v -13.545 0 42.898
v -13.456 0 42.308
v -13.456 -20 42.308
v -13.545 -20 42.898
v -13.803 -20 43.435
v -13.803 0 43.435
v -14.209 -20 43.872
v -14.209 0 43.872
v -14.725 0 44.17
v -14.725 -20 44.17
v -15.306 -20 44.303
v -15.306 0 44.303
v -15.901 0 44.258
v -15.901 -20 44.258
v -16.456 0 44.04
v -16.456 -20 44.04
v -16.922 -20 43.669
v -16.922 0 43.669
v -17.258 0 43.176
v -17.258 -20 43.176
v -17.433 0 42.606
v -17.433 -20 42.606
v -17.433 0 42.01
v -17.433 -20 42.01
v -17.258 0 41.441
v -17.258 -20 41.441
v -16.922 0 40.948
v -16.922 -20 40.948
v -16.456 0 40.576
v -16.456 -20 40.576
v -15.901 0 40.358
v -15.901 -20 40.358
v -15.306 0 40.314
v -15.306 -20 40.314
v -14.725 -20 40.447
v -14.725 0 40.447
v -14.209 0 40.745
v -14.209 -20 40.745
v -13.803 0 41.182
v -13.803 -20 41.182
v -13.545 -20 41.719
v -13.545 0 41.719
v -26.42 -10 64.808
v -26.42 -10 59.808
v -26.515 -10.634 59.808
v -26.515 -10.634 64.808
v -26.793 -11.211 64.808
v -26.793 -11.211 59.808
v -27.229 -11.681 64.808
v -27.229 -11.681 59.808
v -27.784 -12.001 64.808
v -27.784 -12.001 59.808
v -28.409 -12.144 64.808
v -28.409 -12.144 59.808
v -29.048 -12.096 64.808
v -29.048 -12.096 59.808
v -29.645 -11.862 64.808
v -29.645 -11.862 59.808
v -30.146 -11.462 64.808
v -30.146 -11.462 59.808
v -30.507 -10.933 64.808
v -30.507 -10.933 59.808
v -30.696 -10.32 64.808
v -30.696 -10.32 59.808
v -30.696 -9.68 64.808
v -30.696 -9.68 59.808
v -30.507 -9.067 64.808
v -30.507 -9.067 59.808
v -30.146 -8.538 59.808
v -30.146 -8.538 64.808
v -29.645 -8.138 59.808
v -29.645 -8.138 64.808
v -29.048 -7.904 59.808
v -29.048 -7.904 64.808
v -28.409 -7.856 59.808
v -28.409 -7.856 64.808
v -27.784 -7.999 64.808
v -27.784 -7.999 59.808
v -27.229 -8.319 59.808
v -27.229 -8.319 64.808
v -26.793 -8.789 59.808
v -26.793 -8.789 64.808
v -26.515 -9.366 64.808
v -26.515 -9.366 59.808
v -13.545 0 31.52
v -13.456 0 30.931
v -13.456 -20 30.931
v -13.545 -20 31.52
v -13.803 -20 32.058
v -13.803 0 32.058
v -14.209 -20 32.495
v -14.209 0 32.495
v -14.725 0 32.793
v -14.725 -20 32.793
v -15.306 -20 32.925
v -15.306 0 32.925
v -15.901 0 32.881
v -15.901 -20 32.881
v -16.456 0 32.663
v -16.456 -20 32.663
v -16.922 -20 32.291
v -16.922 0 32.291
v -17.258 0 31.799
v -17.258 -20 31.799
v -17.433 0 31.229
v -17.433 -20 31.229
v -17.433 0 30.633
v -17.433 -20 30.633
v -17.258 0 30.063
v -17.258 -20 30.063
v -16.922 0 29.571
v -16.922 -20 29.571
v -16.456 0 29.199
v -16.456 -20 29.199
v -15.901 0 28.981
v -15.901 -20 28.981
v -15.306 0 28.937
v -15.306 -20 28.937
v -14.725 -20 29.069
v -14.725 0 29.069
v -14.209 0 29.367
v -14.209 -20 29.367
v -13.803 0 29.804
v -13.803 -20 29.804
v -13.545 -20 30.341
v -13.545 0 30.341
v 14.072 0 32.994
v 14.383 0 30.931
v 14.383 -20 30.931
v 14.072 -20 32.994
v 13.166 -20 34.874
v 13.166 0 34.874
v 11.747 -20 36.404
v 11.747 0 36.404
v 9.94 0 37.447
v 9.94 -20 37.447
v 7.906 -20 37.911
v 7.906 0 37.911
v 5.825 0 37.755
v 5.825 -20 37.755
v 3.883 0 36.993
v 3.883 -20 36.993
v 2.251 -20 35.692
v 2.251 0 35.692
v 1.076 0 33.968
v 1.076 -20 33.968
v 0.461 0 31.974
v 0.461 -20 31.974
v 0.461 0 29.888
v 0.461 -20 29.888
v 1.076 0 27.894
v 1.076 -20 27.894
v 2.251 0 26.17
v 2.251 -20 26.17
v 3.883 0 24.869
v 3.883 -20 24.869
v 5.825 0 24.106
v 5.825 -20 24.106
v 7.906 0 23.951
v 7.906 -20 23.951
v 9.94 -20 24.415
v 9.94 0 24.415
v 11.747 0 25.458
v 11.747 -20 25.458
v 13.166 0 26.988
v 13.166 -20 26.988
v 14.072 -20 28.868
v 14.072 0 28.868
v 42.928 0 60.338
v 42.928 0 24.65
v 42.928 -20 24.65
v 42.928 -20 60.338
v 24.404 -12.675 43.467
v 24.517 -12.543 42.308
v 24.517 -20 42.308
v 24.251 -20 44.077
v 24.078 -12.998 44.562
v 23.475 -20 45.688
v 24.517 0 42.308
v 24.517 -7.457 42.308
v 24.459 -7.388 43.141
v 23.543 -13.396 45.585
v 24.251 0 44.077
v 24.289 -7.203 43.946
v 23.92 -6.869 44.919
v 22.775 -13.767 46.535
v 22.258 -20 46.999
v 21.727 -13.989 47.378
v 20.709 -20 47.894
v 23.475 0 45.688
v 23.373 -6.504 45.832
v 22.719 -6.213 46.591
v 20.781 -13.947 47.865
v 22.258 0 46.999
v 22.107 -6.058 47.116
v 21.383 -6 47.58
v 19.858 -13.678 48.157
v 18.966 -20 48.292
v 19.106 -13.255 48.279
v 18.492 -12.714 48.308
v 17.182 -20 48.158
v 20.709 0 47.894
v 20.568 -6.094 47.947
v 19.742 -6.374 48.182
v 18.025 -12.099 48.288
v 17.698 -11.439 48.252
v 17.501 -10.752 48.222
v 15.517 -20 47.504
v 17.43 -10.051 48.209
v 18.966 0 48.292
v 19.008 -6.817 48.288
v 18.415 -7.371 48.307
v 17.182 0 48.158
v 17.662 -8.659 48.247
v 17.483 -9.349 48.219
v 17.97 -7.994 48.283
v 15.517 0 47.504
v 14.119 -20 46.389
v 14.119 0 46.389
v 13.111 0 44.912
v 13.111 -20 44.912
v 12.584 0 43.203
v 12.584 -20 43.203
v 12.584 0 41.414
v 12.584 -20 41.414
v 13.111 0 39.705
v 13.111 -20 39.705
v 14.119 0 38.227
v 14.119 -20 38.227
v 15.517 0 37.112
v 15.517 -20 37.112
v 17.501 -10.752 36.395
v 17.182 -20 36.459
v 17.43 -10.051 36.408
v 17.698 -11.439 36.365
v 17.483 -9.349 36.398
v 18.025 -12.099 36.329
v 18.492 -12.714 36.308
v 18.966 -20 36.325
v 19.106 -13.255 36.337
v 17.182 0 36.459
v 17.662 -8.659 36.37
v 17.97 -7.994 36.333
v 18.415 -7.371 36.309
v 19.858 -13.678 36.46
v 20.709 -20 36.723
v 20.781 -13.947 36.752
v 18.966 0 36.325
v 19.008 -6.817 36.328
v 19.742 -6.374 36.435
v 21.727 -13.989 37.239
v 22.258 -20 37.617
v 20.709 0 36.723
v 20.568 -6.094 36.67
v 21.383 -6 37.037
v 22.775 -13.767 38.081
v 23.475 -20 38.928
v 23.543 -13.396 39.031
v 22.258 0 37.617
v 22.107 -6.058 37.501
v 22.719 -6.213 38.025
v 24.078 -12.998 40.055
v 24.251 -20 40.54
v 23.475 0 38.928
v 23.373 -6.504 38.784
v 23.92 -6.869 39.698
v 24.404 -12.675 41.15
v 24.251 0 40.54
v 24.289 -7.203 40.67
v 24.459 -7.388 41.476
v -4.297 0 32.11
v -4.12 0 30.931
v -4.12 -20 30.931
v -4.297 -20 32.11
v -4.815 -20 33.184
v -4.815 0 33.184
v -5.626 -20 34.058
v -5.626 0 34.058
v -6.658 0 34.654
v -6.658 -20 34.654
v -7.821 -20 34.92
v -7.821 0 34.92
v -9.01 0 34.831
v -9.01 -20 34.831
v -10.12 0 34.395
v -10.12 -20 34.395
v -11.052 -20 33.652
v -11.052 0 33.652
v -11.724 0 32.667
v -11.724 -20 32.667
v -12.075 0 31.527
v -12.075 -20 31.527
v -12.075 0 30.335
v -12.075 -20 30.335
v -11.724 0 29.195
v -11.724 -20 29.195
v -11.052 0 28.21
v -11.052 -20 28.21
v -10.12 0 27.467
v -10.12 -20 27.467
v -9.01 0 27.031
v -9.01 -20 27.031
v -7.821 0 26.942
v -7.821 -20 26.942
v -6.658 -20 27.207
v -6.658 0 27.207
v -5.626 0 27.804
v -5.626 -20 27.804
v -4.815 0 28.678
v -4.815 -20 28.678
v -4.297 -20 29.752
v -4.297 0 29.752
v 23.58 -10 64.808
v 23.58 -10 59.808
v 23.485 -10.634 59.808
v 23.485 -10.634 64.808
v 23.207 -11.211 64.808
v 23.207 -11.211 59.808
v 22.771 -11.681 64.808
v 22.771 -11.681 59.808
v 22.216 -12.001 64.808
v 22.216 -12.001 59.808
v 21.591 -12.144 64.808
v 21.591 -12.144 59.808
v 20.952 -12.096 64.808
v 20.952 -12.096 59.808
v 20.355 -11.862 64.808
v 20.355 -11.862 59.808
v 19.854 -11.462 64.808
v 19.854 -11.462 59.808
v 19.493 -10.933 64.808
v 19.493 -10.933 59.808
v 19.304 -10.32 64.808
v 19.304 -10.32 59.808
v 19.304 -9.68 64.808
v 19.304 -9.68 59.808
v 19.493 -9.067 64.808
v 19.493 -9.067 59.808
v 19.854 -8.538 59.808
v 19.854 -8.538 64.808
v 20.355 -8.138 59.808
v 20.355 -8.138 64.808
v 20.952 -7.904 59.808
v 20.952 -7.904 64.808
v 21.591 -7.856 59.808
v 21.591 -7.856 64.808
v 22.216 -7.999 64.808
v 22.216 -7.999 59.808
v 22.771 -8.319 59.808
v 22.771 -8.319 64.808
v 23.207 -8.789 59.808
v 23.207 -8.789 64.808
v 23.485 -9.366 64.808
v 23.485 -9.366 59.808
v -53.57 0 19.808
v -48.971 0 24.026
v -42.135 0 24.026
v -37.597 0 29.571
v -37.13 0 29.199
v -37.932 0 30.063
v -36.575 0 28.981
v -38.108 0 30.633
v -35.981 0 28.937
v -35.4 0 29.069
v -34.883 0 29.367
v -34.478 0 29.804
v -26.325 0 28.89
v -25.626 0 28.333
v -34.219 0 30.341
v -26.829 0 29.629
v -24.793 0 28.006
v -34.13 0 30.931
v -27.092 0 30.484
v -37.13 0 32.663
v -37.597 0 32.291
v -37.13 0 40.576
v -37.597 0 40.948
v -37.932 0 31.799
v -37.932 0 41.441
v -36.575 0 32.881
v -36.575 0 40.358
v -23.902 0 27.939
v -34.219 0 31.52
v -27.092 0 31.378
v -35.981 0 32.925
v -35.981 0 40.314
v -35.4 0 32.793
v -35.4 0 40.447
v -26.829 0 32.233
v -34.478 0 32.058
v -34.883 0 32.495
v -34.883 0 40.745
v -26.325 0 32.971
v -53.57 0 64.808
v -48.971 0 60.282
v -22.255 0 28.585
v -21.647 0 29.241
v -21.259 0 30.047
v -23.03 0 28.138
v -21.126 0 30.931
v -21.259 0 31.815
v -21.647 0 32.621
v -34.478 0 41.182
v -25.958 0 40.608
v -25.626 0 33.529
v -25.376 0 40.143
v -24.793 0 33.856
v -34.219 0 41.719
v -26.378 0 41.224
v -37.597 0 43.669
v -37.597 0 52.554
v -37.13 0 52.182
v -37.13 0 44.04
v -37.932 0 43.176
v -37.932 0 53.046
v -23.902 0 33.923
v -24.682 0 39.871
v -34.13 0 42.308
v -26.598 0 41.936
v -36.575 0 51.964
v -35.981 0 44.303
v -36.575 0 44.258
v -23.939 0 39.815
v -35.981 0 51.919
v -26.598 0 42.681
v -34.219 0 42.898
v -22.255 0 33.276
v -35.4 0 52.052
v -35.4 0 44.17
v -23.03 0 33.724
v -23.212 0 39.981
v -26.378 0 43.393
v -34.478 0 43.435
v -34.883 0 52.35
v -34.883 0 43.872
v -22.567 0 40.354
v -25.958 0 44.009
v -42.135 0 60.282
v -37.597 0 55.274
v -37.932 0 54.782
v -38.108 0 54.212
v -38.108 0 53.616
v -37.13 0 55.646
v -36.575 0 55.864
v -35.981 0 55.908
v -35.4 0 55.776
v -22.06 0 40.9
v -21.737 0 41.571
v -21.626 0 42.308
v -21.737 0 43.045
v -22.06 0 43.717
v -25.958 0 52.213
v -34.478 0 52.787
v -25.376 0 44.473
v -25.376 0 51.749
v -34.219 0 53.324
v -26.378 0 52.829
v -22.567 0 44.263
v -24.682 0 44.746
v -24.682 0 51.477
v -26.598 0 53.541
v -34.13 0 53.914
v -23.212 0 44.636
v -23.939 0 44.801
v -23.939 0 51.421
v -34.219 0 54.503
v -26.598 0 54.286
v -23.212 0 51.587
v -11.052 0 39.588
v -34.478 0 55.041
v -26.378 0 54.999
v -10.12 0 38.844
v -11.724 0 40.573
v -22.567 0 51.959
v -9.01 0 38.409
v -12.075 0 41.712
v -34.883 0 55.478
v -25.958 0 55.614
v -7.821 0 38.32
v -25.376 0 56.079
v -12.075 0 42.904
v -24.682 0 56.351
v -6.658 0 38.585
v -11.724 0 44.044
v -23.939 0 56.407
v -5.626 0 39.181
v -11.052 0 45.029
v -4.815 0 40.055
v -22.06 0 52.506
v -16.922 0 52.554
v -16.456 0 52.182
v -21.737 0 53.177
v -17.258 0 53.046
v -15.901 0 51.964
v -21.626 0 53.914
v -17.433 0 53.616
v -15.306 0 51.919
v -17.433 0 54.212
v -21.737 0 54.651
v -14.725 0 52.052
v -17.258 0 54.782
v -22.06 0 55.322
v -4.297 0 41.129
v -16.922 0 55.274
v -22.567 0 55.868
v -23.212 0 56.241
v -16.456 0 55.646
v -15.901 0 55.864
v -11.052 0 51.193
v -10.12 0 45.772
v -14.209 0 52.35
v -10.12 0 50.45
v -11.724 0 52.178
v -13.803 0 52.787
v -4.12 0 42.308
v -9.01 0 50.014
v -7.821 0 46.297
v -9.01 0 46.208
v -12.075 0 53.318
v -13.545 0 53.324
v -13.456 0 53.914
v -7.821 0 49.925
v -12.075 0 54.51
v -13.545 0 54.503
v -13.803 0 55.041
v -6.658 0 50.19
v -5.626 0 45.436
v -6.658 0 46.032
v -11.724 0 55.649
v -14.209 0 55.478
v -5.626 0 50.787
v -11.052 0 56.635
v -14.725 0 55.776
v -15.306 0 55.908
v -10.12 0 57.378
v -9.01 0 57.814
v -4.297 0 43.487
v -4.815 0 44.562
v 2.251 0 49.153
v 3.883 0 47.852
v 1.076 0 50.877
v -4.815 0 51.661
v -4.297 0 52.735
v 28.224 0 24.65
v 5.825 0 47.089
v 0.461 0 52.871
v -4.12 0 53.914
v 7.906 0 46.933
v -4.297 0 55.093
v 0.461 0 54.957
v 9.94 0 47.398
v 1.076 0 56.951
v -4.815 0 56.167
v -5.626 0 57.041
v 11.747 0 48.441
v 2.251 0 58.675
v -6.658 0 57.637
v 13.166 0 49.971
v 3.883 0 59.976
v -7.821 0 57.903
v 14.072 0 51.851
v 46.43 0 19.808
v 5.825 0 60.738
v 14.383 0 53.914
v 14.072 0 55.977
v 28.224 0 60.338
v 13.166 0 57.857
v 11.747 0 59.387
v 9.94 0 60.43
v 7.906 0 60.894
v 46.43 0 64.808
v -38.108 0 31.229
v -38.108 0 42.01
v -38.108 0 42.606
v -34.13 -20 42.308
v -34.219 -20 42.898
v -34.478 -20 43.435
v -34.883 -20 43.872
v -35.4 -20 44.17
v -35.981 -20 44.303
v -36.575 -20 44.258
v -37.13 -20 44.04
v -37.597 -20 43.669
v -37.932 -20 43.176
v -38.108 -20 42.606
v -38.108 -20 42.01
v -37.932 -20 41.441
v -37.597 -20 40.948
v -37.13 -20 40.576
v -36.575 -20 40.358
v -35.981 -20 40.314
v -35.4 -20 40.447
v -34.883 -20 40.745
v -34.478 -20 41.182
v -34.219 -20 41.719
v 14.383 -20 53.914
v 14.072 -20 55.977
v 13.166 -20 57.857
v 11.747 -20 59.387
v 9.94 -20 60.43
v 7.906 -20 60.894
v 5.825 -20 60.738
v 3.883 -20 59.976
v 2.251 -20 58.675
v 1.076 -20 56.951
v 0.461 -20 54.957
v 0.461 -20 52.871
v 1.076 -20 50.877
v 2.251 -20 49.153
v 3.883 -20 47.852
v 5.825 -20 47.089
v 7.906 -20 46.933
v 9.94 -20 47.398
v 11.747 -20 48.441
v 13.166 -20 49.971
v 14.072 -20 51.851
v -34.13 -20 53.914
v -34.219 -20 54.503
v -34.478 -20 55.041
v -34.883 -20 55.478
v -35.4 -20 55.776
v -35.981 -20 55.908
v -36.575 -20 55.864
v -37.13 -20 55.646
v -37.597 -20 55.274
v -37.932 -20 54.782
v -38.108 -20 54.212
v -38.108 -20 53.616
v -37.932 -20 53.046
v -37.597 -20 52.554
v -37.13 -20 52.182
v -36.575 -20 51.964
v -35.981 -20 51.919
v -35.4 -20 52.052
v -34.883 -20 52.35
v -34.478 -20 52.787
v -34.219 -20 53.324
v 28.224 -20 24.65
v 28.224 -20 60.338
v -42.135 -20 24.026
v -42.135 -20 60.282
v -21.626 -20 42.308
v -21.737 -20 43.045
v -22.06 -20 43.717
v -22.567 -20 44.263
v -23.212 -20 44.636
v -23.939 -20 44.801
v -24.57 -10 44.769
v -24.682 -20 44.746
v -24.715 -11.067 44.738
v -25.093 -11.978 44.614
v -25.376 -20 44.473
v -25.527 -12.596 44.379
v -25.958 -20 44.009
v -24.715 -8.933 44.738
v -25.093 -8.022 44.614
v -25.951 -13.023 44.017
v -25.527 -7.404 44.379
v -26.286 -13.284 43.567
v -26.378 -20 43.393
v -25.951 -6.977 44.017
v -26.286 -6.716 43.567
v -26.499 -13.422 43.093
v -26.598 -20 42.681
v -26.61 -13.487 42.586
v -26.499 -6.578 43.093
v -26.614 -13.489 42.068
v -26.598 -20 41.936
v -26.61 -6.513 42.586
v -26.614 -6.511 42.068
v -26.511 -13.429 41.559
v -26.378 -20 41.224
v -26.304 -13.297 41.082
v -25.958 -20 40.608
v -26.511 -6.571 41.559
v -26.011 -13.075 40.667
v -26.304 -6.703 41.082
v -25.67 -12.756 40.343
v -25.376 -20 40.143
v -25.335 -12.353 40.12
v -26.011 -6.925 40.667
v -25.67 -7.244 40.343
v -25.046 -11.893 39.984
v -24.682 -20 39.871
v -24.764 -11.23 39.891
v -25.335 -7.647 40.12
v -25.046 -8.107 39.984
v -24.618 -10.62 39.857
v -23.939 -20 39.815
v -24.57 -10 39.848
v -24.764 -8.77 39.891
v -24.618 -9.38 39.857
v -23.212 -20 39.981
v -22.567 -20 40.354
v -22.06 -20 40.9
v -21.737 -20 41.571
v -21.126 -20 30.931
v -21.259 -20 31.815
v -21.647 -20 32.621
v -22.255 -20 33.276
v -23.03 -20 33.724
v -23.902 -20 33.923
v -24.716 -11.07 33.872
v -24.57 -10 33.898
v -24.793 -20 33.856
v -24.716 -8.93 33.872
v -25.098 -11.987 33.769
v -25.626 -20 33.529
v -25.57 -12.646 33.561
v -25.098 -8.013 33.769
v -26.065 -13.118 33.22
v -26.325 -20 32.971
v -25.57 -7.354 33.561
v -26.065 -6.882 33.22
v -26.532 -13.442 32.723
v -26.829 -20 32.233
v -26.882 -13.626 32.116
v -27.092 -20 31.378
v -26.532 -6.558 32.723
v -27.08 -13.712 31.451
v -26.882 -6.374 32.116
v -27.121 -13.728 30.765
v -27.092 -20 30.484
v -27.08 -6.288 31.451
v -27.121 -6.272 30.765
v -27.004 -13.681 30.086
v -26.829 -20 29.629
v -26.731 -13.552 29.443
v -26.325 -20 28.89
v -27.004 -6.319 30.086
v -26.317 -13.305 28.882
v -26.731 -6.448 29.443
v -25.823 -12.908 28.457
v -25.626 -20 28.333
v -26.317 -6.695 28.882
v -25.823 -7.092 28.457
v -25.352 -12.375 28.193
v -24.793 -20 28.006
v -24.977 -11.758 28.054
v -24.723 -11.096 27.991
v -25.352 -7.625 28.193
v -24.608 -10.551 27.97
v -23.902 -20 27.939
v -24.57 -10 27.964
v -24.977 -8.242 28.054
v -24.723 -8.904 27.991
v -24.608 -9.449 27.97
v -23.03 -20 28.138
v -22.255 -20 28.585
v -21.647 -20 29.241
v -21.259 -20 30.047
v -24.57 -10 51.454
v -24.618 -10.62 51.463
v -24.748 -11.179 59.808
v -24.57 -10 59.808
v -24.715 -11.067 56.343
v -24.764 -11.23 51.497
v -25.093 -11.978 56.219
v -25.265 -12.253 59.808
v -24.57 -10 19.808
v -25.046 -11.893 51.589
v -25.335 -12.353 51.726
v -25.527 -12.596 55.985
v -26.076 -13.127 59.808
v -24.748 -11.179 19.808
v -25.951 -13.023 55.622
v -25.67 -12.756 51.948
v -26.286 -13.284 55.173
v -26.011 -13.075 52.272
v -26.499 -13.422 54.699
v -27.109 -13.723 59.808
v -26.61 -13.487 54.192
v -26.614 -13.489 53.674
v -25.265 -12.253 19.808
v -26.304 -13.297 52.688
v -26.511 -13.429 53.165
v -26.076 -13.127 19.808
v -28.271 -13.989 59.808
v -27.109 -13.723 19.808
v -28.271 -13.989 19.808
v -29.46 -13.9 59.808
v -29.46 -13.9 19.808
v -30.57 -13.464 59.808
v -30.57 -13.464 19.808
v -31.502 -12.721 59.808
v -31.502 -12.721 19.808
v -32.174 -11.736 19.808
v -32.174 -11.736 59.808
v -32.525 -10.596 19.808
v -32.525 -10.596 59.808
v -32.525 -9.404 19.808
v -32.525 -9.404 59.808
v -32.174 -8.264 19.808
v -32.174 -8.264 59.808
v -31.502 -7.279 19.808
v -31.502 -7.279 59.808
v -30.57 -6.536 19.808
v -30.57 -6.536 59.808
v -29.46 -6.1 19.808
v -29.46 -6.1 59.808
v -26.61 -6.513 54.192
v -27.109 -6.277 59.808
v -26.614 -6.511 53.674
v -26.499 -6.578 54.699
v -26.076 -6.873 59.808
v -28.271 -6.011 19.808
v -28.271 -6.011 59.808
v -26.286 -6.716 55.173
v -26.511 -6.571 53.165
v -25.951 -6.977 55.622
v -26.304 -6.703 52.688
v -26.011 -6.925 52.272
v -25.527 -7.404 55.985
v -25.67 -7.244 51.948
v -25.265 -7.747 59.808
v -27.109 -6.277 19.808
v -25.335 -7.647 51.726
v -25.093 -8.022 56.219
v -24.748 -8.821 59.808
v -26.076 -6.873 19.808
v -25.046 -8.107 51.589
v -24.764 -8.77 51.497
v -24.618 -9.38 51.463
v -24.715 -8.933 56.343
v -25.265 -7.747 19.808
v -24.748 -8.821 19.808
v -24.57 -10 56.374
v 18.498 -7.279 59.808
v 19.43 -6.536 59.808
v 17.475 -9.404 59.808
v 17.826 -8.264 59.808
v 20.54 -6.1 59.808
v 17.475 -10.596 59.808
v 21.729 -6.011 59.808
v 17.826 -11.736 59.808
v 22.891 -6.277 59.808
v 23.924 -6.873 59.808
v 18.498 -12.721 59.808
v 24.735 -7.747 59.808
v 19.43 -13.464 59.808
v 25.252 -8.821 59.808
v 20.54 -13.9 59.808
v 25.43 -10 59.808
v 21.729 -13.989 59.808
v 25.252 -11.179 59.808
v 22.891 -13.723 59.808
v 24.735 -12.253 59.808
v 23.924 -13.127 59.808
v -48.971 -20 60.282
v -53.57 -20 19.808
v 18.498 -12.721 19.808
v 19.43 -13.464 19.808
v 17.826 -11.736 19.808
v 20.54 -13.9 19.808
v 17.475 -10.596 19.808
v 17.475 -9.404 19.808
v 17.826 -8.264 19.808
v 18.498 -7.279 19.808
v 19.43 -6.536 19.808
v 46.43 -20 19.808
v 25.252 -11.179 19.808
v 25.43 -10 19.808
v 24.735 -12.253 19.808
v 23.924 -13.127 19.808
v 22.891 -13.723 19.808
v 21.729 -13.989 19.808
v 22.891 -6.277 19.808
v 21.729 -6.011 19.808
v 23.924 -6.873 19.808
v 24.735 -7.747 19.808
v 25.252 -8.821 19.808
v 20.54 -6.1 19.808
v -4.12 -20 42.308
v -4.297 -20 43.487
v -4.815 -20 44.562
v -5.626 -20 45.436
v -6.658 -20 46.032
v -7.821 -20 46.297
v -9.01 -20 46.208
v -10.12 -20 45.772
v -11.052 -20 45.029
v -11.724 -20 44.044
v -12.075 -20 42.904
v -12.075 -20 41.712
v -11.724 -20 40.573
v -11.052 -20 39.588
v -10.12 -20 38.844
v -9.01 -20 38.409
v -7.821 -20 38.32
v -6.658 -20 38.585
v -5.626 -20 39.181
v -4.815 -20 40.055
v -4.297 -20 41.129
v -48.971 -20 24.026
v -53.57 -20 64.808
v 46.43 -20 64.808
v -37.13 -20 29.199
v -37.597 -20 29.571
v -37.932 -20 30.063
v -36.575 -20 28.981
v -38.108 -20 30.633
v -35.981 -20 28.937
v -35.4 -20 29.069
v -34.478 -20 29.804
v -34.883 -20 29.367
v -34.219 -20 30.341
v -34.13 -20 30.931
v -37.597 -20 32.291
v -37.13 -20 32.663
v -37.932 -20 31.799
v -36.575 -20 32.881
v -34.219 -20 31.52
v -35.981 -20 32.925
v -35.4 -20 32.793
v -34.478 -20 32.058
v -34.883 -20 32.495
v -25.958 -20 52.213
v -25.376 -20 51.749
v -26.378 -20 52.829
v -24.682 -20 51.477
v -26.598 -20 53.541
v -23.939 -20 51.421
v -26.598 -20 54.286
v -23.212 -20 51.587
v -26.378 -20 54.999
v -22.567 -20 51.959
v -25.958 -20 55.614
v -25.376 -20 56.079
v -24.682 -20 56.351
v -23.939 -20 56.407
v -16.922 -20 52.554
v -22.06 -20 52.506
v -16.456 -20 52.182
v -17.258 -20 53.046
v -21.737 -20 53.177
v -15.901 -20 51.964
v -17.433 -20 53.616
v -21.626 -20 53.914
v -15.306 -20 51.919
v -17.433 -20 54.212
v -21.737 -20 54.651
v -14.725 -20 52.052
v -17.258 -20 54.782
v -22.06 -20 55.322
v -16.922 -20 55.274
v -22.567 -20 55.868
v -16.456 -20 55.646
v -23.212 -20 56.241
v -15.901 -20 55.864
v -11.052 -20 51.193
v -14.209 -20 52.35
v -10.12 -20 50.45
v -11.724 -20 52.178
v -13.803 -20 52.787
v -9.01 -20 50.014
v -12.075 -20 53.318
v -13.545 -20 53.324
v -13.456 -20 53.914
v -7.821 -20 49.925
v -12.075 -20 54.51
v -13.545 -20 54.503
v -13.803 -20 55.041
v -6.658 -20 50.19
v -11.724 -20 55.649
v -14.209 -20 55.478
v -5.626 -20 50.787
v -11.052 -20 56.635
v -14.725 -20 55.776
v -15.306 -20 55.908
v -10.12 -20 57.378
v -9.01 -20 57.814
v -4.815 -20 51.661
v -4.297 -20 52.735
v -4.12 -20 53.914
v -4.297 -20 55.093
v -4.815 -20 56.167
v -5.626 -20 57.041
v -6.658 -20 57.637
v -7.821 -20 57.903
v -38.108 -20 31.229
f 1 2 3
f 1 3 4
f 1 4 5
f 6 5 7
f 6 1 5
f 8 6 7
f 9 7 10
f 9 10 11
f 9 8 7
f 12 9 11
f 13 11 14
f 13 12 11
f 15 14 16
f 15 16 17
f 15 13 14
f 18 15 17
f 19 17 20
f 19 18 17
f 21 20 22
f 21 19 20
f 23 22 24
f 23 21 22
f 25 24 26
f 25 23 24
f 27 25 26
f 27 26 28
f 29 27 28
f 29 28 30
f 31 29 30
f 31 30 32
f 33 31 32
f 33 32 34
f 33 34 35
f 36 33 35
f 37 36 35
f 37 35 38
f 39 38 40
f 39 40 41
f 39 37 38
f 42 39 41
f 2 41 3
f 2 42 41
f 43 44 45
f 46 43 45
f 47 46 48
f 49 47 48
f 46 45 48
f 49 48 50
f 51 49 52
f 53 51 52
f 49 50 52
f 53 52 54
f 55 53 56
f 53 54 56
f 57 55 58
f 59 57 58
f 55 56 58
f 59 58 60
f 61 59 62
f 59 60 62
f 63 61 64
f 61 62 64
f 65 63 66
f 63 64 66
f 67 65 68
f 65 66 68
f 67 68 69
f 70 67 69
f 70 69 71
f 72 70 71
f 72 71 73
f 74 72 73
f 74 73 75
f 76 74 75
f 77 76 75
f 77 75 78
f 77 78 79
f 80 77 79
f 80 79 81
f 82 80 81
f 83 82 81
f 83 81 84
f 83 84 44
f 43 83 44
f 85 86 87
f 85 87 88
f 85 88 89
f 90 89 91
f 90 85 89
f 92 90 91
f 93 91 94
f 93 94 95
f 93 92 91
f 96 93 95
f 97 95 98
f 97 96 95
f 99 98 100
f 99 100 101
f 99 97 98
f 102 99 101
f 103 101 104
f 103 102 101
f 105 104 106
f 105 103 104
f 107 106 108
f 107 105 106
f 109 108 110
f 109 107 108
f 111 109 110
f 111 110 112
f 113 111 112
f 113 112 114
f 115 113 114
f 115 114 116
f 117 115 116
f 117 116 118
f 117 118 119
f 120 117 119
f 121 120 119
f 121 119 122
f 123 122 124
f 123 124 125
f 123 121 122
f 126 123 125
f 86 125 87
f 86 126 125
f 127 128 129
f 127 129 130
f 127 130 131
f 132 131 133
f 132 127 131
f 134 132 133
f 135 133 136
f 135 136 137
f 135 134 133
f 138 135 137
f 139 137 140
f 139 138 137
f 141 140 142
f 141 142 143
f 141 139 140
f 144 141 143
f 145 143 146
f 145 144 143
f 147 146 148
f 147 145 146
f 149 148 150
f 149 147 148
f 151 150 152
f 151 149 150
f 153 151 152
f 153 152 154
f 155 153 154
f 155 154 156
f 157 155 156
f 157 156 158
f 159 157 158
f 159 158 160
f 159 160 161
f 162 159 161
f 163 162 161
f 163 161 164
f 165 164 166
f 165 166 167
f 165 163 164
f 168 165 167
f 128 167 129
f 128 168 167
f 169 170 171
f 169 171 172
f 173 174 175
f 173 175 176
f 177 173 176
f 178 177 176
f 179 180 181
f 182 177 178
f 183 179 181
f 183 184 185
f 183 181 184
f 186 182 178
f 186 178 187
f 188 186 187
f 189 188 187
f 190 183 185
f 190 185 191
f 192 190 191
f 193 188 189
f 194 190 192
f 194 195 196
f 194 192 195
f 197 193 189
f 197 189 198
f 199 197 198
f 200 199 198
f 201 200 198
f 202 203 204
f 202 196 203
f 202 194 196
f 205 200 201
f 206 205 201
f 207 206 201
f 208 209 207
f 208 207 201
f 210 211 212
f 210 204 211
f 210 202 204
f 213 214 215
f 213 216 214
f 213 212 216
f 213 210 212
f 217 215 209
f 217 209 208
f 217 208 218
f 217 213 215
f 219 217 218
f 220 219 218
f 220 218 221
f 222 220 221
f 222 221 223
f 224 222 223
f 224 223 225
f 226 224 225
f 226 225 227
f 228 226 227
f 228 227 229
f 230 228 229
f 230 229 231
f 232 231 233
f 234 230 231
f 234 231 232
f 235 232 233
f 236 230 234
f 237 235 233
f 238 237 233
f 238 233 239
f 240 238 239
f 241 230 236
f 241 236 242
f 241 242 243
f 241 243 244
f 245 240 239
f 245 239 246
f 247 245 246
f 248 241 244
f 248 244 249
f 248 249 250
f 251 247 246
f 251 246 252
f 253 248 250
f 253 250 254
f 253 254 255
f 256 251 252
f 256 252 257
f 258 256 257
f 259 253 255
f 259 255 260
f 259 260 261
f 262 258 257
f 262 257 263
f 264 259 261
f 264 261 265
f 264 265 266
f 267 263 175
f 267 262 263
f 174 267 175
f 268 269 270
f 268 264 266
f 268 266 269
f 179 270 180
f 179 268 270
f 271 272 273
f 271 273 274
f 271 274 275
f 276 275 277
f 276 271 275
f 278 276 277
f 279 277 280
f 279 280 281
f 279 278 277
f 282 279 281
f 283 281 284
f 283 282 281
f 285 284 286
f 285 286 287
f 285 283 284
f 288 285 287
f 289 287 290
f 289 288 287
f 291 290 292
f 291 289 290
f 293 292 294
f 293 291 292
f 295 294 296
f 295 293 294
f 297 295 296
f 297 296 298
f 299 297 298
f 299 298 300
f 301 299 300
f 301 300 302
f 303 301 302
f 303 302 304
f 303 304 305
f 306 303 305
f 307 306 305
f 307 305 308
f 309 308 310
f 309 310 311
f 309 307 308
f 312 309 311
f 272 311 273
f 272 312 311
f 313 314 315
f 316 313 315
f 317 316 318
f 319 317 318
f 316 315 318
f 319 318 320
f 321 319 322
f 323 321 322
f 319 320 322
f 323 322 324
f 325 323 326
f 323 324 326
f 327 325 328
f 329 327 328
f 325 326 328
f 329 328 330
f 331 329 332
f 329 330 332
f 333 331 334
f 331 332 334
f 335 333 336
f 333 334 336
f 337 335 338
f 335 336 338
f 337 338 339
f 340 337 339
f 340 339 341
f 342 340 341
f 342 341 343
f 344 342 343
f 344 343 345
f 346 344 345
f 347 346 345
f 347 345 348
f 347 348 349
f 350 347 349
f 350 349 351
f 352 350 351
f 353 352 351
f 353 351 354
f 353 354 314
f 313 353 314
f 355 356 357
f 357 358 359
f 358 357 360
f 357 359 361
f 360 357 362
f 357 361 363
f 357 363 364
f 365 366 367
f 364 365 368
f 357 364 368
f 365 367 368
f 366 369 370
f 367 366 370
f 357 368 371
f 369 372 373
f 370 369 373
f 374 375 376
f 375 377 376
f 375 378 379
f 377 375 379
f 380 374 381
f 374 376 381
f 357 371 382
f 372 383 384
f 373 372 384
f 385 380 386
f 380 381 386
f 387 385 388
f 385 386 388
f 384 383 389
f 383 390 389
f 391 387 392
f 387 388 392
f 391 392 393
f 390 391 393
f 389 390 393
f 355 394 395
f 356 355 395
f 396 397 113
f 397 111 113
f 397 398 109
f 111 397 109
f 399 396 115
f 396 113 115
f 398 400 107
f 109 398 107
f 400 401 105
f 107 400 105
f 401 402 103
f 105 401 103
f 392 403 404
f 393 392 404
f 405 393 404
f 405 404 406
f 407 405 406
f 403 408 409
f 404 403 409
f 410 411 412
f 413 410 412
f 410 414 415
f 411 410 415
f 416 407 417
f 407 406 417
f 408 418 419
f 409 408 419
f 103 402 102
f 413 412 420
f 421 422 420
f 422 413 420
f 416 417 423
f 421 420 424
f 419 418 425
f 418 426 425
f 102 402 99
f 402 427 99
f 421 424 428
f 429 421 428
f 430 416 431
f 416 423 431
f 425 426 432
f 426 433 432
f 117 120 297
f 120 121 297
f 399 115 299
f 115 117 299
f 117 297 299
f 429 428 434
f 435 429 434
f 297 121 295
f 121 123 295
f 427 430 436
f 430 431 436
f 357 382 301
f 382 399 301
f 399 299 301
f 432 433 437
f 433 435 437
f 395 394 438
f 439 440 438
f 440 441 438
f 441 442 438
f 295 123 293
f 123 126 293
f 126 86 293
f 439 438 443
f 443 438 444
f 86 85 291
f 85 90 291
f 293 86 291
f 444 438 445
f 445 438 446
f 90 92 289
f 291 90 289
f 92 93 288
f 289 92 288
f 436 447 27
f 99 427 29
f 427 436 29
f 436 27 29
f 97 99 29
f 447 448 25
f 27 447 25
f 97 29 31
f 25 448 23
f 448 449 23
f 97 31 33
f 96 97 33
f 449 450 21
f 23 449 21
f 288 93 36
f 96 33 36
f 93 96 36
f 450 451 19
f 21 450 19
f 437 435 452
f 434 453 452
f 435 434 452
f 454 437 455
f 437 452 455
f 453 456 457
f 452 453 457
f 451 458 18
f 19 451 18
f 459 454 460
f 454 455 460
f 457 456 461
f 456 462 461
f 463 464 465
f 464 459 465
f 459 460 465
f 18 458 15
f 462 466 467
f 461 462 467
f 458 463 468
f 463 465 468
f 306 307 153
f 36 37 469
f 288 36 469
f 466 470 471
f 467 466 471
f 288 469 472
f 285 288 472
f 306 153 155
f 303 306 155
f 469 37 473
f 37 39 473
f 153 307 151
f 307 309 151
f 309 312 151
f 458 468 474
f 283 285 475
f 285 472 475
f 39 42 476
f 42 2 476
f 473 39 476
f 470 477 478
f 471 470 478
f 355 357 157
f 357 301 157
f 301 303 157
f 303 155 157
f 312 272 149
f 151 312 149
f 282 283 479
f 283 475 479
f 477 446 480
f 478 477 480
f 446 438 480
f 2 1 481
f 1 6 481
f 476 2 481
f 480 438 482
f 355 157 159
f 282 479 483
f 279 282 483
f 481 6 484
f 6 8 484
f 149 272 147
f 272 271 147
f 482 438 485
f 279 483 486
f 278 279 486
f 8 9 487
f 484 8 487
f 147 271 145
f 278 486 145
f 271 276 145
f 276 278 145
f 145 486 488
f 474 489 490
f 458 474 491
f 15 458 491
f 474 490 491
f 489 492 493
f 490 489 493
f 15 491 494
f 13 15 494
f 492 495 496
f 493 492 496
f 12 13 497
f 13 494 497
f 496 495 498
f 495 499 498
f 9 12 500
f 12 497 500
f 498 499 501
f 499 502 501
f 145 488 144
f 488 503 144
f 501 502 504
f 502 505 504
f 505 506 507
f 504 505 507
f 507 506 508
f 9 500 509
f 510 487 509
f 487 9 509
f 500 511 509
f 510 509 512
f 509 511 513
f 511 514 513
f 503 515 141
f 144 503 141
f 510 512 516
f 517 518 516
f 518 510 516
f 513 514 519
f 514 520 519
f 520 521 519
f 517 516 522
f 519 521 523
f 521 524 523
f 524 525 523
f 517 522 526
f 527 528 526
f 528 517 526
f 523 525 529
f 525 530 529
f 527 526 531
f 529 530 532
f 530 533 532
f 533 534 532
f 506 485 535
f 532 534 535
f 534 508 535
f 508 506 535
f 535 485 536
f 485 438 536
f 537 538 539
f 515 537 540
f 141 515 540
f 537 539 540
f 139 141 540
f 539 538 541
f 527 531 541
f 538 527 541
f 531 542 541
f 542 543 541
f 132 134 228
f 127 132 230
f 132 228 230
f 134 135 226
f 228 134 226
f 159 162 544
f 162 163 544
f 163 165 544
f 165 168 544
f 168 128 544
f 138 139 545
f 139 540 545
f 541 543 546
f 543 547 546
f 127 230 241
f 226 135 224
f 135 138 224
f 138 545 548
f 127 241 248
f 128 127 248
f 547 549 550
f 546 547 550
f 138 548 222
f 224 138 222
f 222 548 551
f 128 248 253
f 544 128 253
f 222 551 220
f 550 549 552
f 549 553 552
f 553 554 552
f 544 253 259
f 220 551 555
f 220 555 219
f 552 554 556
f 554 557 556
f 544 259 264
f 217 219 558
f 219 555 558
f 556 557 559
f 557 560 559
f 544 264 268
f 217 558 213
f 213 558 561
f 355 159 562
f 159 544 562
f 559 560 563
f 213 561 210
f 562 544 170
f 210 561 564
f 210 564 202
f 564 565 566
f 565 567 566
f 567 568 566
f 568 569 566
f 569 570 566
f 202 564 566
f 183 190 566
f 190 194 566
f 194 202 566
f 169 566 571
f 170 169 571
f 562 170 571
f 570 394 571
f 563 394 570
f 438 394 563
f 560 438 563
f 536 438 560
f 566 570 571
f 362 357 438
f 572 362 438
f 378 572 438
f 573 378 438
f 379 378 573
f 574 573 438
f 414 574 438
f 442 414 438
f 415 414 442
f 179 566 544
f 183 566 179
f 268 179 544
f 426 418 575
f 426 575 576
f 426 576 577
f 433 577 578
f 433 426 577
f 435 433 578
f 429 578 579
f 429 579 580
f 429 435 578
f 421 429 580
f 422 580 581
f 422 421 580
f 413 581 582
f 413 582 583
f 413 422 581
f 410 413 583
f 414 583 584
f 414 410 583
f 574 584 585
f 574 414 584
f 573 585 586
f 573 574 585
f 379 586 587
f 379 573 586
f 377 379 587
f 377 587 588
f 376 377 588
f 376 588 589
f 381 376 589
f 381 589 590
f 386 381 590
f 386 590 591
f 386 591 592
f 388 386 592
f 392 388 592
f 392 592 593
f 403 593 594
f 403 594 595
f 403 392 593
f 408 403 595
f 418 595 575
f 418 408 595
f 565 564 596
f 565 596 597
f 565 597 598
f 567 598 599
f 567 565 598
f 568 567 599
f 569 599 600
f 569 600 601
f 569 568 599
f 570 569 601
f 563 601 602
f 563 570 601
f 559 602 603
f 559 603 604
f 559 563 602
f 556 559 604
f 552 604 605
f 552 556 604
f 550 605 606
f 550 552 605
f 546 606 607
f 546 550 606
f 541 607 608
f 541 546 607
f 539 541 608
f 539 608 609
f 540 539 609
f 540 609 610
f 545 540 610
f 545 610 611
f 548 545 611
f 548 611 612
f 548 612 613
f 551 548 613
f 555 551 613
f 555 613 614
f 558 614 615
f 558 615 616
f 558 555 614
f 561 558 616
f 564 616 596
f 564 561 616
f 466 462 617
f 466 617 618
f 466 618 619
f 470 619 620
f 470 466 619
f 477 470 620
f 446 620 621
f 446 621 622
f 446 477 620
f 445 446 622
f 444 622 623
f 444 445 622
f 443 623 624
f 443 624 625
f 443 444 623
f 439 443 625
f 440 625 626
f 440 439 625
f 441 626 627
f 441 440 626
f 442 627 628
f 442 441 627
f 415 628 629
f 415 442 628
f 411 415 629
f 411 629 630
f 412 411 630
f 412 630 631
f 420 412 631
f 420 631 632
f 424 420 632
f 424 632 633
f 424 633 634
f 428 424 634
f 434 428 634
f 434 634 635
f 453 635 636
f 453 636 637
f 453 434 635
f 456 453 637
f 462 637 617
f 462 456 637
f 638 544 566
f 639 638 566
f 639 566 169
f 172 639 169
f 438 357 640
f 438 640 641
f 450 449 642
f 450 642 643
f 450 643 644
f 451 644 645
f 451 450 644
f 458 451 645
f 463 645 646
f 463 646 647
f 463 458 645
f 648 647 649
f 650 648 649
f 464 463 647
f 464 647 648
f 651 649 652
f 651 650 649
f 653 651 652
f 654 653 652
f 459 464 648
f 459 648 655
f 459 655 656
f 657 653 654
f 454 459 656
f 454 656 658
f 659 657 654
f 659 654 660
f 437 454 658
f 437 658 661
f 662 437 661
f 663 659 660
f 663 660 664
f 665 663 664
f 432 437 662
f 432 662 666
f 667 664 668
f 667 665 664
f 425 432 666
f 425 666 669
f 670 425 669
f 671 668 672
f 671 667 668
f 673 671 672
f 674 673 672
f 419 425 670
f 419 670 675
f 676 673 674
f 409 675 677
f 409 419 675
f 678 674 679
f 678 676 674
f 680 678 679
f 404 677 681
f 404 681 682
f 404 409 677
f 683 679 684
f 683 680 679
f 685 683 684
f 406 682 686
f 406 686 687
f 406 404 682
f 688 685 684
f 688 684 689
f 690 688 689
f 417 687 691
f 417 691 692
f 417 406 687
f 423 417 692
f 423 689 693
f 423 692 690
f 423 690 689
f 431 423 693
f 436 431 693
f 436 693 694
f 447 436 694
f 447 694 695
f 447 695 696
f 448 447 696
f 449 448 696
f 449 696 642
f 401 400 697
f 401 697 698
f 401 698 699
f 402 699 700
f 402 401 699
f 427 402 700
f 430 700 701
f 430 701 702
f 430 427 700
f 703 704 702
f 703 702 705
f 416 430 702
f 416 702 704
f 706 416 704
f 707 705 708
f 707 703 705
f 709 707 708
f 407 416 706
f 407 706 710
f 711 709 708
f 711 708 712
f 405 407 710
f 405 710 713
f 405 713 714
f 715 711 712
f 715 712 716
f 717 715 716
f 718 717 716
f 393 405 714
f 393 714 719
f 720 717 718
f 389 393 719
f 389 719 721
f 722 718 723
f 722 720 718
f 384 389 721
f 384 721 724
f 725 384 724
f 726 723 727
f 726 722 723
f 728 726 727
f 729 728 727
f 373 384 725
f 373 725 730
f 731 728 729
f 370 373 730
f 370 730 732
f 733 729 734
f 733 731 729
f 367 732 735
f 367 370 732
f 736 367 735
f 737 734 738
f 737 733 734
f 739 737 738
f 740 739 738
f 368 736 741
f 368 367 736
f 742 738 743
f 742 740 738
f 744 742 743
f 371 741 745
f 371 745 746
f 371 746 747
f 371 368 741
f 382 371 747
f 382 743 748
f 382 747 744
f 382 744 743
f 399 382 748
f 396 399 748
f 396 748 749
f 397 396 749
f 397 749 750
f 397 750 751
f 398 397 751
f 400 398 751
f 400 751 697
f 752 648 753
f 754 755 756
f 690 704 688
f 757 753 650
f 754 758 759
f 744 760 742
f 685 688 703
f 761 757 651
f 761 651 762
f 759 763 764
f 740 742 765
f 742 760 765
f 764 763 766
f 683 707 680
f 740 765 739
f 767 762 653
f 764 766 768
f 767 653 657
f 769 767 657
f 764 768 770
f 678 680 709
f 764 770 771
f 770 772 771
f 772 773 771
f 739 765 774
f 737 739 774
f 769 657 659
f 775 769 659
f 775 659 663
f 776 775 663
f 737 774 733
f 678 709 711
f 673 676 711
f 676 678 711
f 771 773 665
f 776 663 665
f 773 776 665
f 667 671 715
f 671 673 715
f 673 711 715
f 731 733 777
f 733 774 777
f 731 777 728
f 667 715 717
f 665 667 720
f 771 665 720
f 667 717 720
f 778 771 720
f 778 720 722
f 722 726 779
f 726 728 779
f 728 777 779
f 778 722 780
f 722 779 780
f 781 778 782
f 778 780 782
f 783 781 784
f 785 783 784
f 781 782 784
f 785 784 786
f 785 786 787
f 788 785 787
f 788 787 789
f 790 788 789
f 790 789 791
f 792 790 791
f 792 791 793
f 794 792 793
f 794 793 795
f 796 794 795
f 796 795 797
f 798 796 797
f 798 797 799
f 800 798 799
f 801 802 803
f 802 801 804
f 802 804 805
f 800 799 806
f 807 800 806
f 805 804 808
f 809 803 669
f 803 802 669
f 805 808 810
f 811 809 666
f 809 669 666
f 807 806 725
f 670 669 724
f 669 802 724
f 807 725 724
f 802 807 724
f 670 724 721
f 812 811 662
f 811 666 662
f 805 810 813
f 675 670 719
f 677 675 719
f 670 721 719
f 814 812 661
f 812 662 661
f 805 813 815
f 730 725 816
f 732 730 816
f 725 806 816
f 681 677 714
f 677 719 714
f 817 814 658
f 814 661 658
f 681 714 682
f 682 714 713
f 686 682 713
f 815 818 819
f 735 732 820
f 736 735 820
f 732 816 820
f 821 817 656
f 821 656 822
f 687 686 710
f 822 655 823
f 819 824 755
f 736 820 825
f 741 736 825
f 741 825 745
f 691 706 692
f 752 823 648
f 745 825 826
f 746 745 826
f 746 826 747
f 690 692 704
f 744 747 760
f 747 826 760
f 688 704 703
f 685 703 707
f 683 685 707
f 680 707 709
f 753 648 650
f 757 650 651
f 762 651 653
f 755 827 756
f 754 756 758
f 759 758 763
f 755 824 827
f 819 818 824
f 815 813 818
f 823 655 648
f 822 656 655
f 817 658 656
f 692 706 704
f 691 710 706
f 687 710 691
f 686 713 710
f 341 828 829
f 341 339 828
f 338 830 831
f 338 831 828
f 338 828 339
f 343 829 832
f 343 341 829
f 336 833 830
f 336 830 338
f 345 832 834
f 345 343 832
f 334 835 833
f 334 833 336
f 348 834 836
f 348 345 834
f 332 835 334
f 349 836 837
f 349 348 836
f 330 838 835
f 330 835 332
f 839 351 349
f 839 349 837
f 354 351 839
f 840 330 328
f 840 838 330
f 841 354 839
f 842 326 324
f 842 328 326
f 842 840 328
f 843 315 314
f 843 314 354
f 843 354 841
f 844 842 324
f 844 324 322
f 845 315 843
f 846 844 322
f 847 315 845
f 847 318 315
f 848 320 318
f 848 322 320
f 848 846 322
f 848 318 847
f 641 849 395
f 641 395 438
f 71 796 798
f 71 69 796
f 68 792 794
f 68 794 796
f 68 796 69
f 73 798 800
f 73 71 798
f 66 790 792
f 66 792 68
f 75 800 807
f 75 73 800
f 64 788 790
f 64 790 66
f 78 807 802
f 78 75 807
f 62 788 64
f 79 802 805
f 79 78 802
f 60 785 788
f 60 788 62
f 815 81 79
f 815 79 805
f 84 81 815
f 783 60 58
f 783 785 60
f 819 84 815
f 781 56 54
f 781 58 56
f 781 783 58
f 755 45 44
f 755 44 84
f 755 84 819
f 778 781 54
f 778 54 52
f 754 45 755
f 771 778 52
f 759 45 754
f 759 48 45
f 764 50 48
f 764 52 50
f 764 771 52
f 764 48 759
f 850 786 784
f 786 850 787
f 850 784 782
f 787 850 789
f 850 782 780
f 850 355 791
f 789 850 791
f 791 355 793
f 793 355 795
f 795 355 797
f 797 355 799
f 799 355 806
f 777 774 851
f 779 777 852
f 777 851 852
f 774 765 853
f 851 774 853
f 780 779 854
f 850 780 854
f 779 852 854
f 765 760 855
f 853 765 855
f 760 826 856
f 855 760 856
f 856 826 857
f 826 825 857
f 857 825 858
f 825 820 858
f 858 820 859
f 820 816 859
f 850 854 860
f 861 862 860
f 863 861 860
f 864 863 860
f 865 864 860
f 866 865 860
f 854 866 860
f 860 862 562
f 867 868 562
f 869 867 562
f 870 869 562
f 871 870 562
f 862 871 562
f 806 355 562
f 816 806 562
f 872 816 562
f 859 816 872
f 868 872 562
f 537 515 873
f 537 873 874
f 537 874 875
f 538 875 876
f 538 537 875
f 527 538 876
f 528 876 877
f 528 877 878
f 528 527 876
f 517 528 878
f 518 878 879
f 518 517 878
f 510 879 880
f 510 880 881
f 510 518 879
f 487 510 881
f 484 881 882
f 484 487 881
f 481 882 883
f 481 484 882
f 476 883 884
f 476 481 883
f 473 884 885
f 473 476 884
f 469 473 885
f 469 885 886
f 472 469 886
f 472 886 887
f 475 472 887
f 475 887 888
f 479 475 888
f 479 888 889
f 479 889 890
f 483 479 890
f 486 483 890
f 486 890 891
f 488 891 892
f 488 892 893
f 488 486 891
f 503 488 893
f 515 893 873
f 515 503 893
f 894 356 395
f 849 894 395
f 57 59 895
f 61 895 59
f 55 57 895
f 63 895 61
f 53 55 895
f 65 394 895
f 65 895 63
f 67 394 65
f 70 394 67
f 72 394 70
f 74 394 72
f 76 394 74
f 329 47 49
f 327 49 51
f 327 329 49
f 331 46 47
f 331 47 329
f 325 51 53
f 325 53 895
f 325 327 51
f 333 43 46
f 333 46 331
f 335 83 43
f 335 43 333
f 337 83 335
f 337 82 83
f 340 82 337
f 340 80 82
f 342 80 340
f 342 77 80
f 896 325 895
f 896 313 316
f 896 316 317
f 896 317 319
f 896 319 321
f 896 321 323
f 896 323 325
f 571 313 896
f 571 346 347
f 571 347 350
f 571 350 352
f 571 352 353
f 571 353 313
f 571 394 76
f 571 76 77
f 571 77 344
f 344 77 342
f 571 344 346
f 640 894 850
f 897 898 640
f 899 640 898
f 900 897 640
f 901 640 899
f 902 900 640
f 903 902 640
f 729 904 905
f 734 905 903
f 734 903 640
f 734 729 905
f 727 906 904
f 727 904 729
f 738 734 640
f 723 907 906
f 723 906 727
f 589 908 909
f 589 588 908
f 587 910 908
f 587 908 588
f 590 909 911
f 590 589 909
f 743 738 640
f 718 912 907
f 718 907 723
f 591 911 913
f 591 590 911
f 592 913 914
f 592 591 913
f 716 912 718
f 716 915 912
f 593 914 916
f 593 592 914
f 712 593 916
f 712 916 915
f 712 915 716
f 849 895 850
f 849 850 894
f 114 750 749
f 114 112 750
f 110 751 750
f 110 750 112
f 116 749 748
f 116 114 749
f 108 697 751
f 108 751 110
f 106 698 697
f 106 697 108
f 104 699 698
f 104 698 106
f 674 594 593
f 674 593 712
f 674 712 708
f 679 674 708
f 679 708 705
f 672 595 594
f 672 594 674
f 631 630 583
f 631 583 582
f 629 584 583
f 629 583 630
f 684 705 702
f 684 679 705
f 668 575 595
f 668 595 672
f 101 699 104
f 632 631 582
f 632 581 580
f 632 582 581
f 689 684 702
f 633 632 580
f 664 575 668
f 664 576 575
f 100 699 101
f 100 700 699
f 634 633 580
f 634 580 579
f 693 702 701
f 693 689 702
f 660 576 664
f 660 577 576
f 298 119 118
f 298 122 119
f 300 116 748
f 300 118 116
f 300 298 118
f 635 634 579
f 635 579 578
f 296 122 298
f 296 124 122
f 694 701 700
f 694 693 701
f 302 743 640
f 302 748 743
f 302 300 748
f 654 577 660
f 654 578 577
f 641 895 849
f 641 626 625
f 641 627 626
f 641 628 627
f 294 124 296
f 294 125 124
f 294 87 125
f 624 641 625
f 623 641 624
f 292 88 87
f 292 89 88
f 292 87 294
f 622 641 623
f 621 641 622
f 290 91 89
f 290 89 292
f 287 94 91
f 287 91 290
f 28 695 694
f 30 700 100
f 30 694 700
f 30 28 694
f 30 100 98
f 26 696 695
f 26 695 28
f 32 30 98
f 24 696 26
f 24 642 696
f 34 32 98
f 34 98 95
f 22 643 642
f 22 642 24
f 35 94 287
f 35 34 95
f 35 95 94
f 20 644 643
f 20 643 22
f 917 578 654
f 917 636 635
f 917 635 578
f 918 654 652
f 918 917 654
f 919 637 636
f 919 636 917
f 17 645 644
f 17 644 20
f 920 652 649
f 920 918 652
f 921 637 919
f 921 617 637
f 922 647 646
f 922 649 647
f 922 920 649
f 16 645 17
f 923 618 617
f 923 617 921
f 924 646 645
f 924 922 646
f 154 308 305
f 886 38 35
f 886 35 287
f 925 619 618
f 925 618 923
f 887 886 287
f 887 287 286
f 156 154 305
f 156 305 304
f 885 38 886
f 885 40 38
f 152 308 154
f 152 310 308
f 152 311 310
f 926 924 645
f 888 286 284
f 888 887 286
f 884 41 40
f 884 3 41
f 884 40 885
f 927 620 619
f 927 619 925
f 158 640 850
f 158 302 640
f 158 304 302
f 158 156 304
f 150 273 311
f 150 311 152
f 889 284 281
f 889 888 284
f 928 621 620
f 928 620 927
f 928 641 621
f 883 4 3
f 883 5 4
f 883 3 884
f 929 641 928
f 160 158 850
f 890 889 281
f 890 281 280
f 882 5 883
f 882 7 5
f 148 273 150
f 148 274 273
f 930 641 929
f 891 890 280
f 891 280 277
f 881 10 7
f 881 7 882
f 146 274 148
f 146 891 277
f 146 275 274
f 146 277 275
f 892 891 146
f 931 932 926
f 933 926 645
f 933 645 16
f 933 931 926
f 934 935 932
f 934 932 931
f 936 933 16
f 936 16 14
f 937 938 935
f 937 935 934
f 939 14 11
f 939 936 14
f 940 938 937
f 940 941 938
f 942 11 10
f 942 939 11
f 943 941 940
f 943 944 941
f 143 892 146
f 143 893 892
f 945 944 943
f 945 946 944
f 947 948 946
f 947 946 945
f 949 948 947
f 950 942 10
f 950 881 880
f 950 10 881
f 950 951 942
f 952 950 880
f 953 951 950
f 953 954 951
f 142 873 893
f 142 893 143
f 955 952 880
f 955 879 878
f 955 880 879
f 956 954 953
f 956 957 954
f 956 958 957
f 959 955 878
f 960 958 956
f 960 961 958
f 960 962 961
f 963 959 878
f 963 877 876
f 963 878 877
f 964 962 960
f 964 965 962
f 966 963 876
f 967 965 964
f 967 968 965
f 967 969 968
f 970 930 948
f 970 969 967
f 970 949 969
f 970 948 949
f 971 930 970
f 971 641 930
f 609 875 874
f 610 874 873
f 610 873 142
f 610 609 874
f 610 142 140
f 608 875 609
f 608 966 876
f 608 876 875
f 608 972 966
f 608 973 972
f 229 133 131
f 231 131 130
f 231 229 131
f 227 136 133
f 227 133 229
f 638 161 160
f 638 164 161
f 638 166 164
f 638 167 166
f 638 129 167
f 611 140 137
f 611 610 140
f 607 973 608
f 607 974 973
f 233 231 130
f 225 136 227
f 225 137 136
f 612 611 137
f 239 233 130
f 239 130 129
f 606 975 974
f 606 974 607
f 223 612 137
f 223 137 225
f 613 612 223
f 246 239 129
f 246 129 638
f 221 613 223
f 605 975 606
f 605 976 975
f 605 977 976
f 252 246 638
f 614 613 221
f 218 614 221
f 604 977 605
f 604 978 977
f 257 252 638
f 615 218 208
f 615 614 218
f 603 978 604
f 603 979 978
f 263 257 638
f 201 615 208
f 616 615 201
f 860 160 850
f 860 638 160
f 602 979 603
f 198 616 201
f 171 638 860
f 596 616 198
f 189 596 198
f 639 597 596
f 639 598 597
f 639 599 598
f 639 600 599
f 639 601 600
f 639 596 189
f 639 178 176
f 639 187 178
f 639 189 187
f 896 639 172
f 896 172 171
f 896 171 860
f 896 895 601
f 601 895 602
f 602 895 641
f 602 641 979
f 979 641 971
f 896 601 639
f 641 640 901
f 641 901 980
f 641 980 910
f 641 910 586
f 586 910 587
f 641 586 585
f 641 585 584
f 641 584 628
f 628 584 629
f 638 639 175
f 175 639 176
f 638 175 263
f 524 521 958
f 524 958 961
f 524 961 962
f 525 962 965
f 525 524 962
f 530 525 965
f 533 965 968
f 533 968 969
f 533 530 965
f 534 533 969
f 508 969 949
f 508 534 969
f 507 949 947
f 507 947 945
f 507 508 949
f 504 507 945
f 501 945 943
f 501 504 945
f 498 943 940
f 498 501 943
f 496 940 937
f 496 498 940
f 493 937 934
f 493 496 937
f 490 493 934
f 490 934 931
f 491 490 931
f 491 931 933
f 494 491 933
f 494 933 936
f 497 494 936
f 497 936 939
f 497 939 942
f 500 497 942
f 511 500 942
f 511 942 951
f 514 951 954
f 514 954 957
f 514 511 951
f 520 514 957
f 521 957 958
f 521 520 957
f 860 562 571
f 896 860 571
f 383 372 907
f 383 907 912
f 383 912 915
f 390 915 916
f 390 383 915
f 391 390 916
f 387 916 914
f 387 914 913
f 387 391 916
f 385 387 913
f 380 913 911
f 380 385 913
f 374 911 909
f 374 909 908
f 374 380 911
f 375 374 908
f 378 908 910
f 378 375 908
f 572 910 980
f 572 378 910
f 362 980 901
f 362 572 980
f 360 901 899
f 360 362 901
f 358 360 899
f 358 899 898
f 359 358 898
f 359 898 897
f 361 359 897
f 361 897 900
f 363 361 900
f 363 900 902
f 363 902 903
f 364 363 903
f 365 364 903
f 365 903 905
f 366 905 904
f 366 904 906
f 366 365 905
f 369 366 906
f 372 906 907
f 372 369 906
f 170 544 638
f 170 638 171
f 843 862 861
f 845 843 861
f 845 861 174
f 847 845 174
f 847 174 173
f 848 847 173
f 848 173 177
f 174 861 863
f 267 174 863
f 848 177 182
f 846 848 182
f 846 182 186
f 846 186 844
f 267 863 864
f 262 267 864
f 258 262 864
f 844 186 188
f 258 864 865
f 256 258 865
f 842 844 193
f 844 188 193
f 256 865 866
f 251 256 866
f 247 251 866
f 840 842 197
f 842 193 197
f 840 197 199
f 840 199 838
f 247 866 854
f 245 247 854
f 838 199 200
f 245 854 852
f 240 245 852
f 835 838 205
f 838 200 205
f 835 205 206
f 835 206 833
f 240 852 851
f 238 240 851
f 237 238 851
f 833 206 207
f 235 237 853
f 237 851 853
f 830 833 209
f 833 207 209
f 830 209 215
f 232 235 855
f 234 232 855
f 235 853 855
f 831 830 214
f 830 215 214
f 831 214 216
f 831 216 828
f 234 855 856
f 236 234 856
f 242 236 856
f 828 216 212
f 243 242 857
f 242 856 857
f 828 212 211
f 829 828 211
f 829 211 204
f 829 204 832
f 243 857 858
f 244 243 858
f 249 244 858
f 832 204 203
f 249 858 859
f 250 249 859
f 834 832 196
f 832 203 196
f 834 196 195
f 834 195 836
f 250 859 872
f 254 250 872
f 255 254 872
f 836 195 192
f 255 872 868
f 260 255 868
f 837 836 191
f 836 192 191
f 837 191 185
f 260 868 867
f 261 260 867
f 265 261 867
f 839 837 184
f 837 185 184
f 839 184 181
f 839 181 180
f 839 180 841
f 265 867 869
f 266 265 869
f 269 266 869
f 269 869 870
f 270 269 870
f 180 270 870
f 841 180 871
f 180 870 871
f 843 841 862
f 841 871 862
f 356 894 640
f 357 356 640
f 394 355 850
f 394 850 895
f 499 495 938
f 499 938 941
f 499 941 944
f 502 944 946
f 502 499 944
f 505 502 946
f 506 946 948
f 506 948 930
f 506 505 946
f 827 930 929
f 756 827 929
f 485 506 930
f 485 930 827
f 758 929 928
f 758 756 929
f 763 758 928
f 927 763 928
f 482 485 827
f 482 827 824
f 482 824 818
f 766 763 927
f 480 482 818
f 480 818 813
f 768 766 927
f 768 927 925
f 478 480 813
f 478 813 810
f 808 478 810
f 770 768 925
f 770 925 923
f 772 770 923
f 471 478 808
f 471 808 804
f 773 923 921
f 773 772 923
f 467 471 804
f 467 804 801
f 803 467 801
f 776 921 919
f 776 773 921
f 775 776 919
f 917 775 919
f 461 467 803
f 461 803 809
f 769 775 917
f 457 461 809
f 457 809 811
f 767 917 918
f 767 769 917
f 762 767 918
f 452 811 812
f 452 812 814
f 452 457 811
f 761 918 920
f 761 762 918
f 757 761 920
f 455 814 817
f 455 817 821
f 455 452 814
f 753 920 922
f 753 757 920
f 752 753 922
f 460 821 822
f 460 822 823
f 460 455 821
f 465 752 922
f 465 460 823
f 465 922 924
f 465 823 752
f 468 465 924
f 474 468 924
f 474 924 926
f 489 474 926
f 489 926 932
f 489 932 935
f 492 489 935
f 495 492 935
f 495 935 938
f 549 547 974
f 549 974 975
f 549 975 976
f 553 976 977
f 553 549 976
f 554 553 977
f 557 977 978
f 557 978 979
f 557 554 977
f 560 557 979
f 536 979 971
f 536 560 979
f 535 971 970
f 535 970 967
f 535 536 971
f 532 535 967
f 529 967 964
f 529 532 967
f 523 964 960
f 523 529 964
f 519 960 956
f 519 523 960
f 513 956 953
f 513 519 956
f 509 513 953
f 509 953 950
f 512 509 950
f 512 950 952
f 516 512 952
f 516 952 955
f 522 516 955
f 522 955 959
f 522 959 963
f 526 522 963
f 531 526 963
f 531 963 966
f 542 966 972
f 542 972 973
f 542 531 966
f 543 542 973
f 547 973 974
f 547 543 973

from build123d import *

# Parameters (mm, degrees)
F0_W     = 100
F0_H     = 45
F0_R     = 2
F0_R_2   = 3
F0_R_3   = 4
F0_W_2   = 6.83609
F0_H_2   = 36.256011
F0_R_4   = 7
F0_R_5   = 2.5
F0_R_6   = 6
F0_W_3   = 14.703342
F0_H_3   = 35.687724
F1_DEPTH = 20
F2_R     = 2.15
F3_DEPTH = 50
F4_R     = 4
F5_DEPTH = 40


with BuildPart() as f1:
    # F0 (on Front) → F1 (new body)
    with BuildSketch(Plane.XZ):
        with Locations((-3.569908, 42.308319)):
            Rectangle(F0_W, F0_H)
        with Locations((-36.130425, 30.930979)):
            Circle(F0_R, mode=Mode.SUBTRACT)
        with Locations((-24.125798, 30.930979)):
            Circle(F0_R_2, mode=Mode.SUBTRACT)
        with Locations((-15.455791, 30.930979)):
            Circle(F0_R, mode=Mode.SUBTRACT)
        with Locations((-8.11963, 30.930979)):
            Circle(F0_R_3, mode=Mode.SUBTRACT)
        with Locations((-45.552673, 42.154359)):
            Rectangle(F0_W_2, F0_H_2, mode=Mode.SUBTRACT)
        with Locations((7.382729, 30.930979)):
            Circle(F0_R_4, mode=Mode.SUBTRACT)
        with Locations((-36.130425, 42.308319)):
            Circle(F0_R, mode=Mode.SUBTRACT)
        with Locations((-24.125798, 42.308319)):
            Circle(F0_R_5, mode=Mode.SUBTRACT)
        with Locations((-15.455791, 42.308319)):
            Circle(F0_R, mode=Mode.SUBTRACT)
        with Locations((-8.11963, 42.308319)):
            Circle(F0_R_3, mode=Mode.SUBTRACT)
        with Locations((-36.130425, 53.91388)):
            Circle(F0_R, mode=Mode.SUBTRACT)
        with Locations((-24.125798, 53.91388)):
            Circle(F0_R_5, mode=Mode.SUBTRACT)
        with Locations((-15.455791, 53.91388)):
            Circle(F0_R, mode=Mode.SUBTRACT)
        with Locations((-8.11963, 53.91388)):
            Circle(F0_R_3, mode=Mode.SUBTRACT)
        with Locations((18.517302, 42.308319)):
            Circle(F0_R_6, mode=Mode.SUBTRACT)
        with Locations((35.576041, 42.493804)):
            Rectangle(F0_W_3, F0_H_3, mode=Mode.SUBTRACT)
        with Locations((7.382729, 53.91388)):
            Circle(F0_R_4, mode=Mode.SUBTRACT)
    extrude(amount=F1_DEPTH)

    # F2 (on face) → F3 (cut)
    with BuildSketch(Plane(origin=(0, 0, 19.808319), x_dir=(1, 0, 0), z_dir=(0, 0, -1))):
        with Locations((21.430092, 10)):
            Circle(F2_R)
        with Locations((-28.569908, 10)):
            Circle(F2_R)
    extrude(amount=-F3_DEPTH, mode=Mode.SUBTRACT)

    # F4 (on face) → F5 (cut)
    with BuildSketch(Plane(origin=(0, 0, 19.808319), x_dir=(1, 0, 0), z_dir=(0, 0, -1))):
        with Locations((-28.569908, 10)):
            Circle(F4_R)
        with Locations((21.430092, 10)):
            Circle(F4_R)
    extrude(amount=-F5_DEPTH, mode=Mode.SUBTRACT)


solid = f1.part
